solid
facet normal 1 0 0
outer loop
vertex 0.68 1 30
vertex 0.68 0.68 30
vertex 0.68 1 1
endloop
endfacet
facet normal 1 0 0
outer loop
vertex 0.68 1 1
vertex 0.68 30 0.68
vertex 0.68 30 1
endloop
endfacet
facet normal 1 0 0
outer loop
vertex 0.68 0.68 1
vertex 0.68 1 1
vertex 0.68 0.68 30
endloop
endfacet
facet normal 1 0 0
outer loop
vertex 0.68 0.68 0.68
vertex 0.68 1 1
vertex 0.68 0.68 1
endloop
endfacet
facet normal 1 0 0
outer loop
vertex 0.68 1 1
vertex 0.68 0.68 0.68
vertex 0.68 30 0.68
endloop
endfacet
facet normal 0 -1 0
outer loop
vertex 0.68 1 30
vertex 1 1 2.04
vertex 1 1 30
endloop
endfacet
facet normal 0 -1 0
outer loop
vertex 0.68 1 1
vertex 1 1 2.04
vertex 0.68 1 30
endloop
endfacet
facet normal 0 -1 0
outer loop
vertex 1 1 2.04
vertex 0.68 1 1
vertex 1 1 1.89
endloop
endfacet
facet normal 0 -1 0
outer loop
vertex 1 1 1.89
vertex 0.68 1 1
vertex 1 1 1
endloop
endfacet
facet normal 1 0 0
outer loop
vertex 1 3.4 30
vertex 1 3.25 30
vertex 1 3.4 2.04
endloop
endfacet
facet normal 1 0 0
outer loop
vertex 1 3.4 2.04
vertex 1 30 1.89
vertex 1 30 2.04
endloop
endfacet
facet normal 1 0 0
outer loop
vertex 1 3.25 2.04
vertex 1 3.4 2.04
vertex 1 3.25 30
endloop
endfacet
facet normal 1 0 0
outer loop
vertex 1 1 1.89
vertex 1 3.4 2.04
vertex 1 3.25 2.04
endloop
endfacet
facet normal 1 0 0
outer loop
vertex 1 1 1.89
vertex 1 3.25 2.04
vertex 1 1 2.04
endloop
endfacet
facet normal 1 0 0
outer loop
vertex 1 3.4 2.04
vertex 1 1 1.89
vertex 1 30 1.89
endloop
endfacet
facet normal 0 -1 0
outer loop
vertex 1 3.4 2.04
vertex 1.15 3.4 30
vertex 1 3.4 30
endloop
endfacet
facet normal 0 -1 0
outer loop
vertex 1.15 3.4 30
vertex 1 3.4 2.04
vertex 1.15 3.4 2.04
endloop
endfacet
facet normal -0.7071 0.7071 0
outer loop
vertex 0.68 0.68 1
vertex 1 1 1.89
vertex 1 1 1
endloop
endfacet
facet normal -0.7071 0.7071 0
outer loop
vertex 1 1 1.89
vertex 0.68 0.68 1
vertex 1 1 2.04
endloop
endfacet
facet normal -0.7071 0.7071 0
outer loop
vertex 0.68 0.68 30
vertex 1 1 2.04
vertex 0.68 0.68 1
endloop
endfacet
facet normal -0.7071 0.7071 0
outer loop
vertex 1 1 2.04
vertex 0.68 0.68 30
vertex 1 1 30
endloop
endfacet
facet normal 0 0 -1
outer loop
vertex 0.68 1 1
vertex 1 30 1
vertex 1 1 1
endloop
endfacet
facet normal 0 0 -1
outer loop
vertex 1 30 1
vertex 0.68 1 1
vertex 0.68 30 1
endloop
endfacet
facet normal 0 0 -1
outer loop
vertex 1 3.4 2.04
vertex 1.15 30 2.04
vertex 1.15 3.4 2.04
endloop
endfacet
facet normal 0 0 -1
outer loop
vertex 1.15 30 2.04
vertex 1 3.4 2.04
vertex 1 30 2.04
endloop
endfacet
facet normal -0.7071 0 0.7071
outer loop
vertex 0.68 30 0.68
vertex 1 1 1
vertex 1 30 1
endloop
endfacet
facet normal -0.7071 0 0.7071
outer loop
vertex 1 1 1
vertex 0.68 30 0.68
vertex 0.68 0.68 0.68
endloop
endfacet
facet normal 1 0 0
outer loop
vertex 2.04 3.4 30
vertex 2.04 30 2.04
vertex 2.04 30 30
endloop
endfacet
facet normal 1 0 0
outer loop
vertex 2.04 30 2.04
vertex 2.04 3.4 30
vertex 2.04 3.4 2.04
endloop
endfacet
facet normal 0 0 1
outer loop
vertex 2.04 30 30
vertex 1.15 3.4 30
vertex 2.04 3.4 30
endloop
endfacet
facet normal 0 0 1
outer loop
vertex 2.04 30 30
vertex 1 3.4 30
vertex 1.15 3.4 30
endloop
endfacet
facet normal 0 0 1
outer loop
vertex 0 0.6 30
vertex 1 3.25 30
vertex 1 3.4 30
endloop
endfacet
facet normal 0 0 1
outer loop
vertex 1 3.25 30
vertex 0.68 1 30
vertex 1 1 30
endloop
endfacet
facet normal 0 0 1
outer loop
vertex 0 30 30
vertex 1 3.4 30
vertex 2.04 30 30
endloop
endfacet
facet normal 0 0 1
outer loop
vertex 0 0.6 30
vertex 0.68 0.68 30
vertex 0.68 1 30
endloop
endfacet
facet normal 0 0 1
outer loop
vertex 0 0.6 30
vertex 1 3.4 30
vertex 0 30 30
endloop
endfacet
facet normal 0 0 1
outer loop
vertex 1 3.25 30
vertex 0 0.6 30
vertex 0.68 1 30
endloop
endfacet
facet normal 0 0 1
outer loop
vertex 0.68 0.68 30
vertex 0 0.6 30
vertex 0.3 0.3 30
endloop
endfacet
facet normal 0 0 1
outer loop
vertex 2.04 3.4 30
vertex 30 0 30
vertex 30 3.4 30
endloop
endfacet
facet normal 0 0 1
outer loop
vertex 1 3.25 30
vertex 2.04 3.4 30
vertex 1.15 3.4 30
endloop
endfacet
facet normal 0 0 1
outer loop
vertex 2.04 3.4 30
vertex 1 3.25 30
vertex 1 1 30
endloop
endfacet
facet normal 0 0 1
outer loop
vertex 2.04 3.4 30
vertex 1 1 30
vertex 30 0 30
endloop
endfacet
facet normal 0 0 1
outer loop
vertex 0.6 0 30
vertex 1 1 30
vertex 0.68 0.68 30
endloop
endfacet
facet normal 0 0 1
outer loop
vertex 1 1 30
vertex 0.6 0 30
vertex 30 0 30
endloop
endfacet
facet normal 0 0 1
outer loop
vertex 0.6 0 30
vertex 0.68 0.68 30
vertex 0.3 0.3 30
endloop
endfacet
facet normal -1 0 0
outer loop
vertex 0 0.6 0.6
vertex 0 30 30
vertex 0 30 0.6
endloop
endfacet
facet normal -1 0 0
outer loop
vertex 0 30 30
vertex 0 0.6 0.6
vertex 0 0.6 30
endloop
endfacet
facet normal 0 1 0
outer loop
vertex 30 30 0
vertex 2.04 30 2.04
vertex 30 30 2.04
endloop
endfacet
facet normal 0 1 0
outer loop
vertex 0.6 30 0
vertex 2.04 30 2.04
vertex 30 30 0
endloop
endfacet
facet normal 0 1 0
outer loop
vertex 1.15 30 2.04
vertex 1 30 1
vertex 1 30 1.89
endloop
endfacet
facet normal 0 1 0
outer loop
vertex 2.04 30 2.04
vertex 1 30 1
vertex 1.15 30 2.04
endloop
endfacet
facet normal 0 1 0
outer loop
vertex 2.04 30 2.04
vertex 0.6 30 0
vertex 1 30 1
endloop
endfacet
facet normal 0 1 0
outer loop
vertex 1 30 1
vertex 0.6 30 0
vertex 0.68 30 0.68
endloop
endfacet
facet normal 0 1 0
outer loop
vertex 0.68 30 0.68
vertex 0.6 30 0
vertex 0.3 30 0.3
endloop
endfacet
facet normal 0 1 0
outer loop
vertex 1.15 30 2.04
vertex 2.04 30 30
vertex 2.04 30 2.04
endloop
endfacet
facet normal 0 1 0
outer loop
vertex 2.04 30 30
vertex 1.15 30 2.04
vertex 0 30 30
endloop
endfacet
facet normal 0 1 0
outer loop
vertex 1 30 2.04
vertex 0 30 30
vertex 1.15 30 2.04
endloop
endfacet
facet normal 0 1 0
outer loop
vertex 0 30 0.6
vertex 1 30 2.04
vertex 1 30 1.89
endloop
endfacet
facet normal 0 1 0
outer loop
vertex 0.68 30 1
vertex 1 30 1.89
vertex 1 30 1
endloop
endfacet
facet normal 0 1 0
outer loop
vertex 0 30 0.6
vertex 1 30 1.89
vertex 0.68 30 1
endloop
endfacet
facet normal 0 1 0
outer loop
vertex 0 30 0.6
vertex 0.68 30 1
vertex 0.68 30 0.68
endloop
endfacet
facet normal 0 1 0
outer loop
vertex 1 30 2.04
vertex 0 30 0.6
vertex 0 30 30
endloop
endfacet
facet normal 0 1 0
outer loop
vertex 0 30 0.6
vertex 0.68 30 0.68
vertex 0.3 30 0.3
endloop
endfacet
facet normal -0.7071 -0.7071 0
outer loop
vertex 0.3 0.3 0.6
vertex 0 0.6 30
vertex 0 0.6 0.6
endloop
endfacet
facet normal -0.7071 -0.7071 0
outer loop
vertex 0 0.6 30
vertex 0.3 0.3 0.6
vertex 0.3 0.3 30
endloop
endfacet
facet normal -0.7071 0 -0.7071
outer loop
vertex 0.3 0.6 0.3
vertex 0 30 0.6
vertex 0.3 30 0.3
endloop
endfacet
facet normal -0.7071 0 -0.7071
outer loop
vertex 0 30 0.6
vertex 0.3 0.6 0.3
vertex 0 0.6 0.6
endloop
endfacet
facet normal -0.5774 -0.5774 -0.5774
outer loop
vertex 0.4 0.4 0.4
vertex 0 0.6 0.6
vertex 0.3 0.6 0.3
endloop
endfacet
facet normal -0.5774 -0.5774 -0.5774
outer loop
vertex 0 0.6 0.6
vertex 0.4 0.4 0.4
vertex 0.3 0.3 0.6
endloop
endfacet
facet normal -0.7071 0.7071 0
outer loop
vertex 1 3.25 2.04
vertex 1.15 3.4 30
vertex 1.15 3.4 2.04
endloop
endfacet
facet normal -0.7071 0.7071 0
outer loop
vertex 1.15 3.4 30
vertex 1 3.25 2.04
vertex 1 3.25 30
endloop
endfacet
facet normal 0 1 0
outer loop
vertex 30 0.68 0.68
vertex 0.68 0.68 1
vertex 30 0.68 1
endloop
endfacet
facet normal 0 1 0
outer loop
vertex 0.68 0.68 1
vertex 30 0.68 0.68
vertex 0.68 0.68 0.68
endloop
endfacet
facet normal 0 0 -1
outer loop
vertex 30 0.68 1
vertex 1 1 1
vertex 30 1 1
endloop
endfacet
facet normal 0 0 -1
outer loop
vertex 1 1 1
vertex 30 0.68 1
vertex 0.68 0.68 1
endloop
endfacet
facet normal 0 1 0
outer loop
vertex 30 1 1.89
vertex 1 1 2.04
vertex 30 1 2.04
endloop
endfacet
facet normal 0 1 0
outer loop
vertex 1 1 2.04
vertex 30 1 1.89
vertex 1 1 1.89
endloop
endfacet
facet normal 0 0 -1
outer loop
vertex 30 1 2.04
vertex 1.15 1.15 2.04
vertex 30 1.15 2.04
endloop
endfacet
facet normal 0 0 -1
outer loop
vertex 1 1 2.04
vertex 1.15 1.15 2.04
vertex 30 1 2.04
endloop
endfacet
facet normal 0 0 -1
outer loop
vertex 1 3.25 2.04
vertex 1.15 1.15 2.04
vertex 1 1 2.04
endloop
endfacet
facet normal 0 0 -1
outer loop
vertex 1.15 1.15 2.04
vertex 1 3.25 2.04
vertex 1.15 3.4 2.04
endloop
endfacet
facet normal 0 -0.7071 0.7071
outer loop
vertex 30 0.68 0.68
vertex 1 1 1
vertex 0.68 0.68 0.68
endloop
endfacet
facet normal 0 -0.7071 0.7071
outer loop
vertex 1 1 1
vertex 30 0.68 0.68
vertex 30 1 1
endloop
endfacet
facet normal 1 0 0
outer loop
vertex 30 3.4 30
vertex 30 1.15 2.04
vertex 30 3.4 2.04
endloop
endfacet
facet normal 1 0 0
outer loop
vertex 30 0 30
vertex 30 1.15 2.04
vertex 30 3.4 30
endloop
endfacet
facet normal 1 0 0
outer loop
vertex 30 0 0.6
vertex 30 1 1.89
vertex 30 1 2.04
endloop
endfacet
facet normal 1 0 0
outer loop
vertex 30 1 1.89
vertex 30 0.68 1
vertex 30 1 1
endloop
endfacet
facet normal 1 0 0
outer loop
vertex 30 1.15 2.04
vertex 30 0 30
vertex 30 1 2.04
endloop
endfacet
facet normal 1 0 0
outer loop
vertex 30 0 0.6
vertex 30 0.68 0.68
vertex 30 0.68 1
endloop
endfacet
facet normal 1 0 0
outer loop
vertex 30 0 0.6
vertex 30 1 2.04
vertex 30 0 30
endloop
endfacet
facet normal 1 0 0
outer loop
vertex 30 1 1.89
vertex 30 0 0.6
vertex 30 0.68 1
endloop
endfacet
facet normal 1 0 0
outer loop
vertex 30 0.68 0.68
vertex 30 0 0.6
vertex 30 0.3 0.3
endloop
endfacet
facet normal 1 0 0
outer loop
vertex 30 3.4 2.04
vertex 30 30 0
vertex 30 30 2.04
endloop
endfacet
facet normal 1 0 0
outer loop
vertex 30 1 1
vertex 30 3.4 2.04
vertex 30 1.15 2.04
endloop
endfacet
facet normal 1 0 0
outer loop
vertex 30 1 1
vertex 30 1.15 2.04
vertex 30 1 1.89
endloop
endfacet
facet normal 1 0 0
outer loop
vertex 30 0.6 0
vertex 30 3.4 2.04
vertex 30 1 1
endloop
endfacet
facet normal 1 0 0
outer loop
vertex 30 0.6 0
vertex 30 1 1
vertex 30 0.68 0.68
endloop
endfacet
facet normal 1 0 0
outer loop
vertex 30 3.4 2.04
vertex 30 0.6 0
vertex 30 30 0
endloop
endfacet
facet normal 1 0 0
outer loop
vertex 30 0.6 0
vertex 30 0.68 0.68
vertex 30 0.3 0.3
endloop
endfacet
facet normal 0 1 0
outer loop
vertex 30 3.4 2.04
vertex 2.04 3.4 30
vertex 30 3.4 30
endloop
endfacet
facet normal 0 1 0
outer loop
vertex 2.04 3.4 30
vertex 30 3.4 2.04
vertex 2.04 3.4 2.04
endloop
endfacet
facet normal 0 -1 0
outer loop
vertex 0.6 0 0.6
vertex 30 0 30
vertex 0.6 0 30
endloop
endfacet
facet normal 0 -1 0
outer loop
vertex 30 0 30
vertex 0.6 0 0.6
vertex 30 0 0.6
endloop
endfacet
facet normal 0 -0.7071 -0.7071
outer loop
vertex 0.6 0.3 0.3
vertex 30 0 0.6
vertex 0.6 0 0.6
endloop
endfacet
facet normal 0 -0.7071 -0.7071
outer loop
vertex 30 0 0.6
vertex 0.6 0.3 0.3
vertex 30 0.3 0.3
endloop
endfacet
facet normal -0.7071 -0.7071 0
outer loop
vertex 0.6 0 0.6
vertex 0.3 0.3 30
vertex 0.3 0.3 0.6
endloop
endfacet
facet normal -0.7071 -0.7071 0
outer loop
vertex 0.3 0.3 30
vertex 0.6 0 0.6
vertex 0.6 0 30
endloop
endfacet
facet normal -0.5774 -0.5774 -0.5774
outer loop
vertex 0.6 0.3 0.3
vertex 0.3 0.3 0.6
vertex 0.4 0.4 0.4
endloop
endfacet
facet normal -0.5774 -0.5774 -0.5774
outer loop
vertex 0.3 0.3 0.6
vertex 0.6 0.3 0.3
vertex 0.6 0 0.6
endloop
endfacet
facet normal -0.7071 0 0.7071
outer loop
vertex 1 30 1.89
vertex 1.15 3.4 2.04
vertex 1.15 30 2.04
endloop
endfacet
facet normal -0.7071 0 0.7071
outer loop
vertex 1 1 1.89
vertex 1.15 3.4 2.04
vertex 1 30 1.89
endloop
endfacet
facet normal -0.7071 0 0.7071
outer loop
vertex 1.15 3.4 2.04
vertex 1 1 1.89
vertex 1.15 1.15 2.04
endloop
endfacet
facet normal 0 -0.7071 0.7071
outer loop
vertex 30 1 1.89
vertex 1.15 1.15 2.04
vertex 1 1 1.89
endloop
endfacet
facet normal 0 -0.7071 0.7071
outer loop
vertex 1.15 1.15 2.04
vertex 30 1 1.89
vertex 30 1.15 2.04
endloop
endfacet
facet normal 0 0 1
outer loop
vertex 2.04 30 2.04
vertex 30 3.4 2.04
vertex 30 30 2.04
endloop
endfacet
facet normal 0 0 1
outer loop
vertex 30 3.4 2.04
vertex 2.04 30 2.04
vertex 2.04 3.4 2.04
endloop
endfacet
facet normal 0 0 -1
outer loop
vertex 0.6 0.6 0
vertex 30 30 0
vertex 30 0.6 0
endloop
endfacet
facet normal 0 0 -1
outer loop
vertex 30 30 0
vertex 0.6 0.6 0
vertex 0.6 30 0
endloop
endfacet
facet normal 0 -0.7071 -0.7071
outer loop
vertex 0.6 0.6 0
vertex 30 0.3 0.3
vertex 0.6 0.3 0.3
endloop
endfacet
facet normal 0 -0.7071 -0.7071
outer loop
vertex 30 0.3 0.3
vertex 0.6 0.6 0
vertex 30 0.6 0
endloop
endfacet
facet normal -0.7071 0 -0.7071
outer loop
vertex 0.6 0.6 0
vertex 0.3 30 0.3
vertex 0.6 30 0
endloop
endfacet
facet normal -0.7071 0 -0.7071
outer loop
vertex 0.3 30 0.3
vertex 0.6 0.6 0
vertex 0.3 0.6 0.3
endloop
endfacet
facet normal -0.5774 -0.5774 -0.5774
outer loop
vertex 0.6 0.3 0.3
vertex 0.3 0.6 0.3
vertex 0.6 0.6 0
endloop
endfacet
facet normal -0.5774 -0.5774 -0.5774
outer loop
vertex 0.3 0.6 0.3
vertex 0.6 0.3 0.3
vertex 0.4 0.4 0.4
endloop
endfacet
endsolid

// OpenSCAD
// file: ../../lib/piece.scad
// Pieces: what a print is made of, as the slicer sees it.
//
//   use <../../lib/orca.scad>
//   use <../../lib/piece.scad>
//   piece("lid", [orca_bottom_pattern("concentric")]) color("green") lid();
//
// A piece is a part in Orca, with a name and, if it likes, slicer settings of
// its own: a list of them, from orca.scad (python/generate.py makes the
// projects). Draw every solid of a print inside one; they can be anywhere,
// in a module as well as at the top of the file, but not inside each other.
// Either mistake stops the export: a solid in no piece would be in all of them.
//
// Orca keeps some settings for a whole object, not a part: a layer height, a
// seam's place, a brim. A piece with one of those becomes an object of its
// own, beside the object of everything else, along with any that share its
// name.
//
// OpenSCAD has no way to hand over one piece of what it draws, or to name
// it. So a piece says what it is in the log, and generate.py asks for each in
// turn, by setting $only: then every other piece draws nothing.
//
// Pieces that share a name and settings come out together. Give them
// different colors and each is still a part of its own, so long as they are
// separate statements at the top of the file; drawn inside a module they are
// one solid, and want names of their own.
//
// $piece_prefix goes before the names of the pieces drawn under it, to tell
// apart those of a module drawn more than once.

use <orca.scad>

module piece(name, settings = []) {
  assert(name != "", "a piece wants a name");
  outer = is_undef($in_piece) ? "" : $in_piece;
  assert(outer == "", str("piece ", name, " is inside piece ", outer, ", and would never be drawn"));
  full = is_undef($piece_prefix) || $piece_prefix == "" ? name : str($piece_prefix, " ", name);
  flat = orca_flat(settings);
  echo(piece = full, orca = flat);
  // Asked for as they are written in the log.
  if (is_undef($only) || $only == [full, str(flat)]) {
    $in_piece = full;
    children();
  }
}
// file: ../../lib/orca.scad
// Orca's settings, for a whole print or for one piece of it.
//
//   use <../../lib/orca.scad>
//   use <../../lib/piece.scad>
//   orca([orca_process("0.12 Fine"), orca_layer_height(0.1)]);
//   piece("lid", [orca_bottom_pattern("concentric")]) lid();
//
// A setting is a function here, the same one wherever it is used: it gives a
// [key, value], the key being the setting's name in Orca's preset files (and
// in its PrintConfig.cpp). orca_setting is any of them, by that name; the
// rest are the ones in use, named to be read.
//
// Settings go in a list, and a list of them can go in another: orca_brim is
// two, say.
//
// orca() is for the whole print. It can be anywhere, more than once, and under
// an `if`; a later one's settings win. Opening the project applies them on top
// of whatever presets Orca has selected, and leaves everything else alone.
// piece() takes a list for that piece alone (piece.scad). Either way they
// reach python/generate.py through OpenSCAD's log.
//
// printer, process and filament are not settings but presets, which Orca
// keeps as selected: those say what to pick by hand, in the project's name.

module orca(settings) {
  echo(orca = orca_flat(settings));
}

// A list of settings, and of lists of them, as one list of [key, value].
function orca_flat(v) =
  is_undef(v) || v == [] || v == "" ? [] : is_string(v[0]) ? [v] : [for (x = v) each orca_flat(x)];

// Any setting, by its name in Orca.
function orca_setting(key, value) = [key, value];

// The process preset to pick.
function orca_process(name) = ["process", name];

function orca_layer_height(h) = ["layer_height", h];
function orca_first_layer_height(h) = ["initial_layer_print_height", h];
// How far the first layer is drawn in, against its squash on the bed.
function orca_elephant_foot(mm) = ["elefant_foot_compensation", mm];

// Where each layer's seam goes: nearest, aligned, back, random.
function orca_seam(position) = ["seam_position", position];

// The pattern of the face on the bed, and of the one on top: monotonic,
// concentric, hilbertcurve, octagramspiral, archimedeanchords...
function orca_bottom_pattern(pattern) = ["bottom_surface_pattern", pattern];
function orca_top_pattern(pattern) = ["top_surface_pattern", pattern];
// The direction of those faces' lines, in degrees counter-clockwise from +x.
function orca_bottom_direction(a) = ["bottom_layer_direction", a];
function orca_top_direction(a) = ["top_layer_direction", a];
// The direction of the first layer's lines on the bed, likewise.
function orca_solid_infill_direction(a) = ["solid_infill_direction", a];
// Directions follow the model, so that turning it in Orca turns the lines too.
function orca_align_infill_to_model(on = true) = ["align_infill_direction_to_model", on ? 1 : 0];

// A brim: outer_only, inner_only, outer_and_inner, no_brim.
function orca_brim(type, width) = [["brim_type", type], ["brim_width", width]];

// A rough skin: on external walls, all of them, or none. What isn't given
// stays as it is in Orca.
function orca_fuzzy_skin(where = "external", thickness, point_distance, noise, scale, octaves, persistence) = [
  ["fuzzy_skin", where],
  if (!is_undef(thickness)) ["fuzzy_skin_thickness", thickness],
  if (!is_undef(point_distance)) ["fuzzy_skin_point_distance", point_distance],
  if (!is_undef(noise)) ["fuzzy_skin_noise_type", noise],
  if (!is_undef(scale)) ["fuzzy_skin_scale", scale],
  if (!is_undef(octaves)) ["fuzzy_skin_octaves", octaves],
  if (!is_undef(persistence)) ["fuzzy_skin_persistence", persistence],
];
// main file
// Coupon for a box corner in mitred rabbets (see mitred-rabbet.scad): the
// three panels that meet there, each printed with its outside face on the bed.
//
// The corner is at the origin and the box's inside is +x, +y, +z. Panel i's
// outside face is the plane where axis i is 0: 0 is a side, 1 the front, 2
// the floor. That is also their rank: along each edge, the higher panel ends
// square and sits in a rabbet in the lower one. So the front drops between
// the sides, and the floor drops into all the walls.
//
// Each panel is its slab, less what the joint along each of its two edges
// gives to the other panel there. Those cuts run on through the corner, and
// between them share it out with nothing left over and nothing overhanging.

// export: print

use <../../lib/orca.scad>
use <../../lib/piece.scad>

orca([orca_process("0.08 High Quality"), orca_layer_height(0.08), orca_first_layer_height(0.2), orca_seam("back")]);

/* [Output] */
part = "fit"; // [fit, exploded, print]

/* [Joint] */
// Panel thickness: side, front, floor. Rough; see `t`.
thick = [2, 3.4, 2];
// Depth of the mitre below the outside faces; also the thickness of the
// tongue under a rabbet. Rough; see `mitre`.
mitre_depth = 1;
// Gap between the mitre's faces, taken from the lower panel and measured
// along its face. At 0.2 mm layers a printed 45° face is proud of the model,
// and levers the panels acute; at 0.08 mm, mitred-rabbet.scad's pairs were
// squarest and tightest with none, and leant further open with each 0.05 mm.
mitre_gap = 0;
// Gap between a panel's end and the floor of the rabbet it sits in.
gap = 0;
// Depth of the glue break: a trough under the mitre's inner end, cut from
// the lower panel. The joint goes together dry, and thin glue run along the
// inside corner wicks through the rabbet; it can't cross the trough, so it
// stops short of the mitre and the outside. Rough; see `brk`.
break_depth = 0.3;
// Chamfer on the box's outside edges.
chamfer = 0.6;
// Relief on a panel's inside end corner, to clear the rabbet's inside corner.
relief = 0.15;

/* [Layers] */
// As sliced. Heights in the joint snap to whole layers.
first_layer = 0.2;
layer = 0.08;

/* [Coupon] */
// Length of each edge.
len = 30;
bed_gap = 5;
explode = 8;

/* [Hidden] */
big = 2 * len;

// h to the nearest height the slicer ends a layer at.
function snap(h) = first_layer + round((h - first_layer) / layer) * layer;
t = [for (h = thick) snap(h)];
mitre = snap(mitre_depth);
brk = round(break_depth / layer) * layer;
names = ["side", "front", "floor"];

function unit(i) = [for (k = [0 : 2]) k == i ? 1 : 0];

// Children drawn in (depth below a, depth below b, along their edge) land in
// box coordinates.
module edge_frame(a, b) {
  ea = unit(a); eb = unit(b); ec = unit(3 - a - b);
  multmatrix([for (k = [0 : 2]) [ea[k], eb[k], ec[k], 0]]) translate([0, 0, -1]) linear_extrude(big)
    children();
}

// What panel a, the higher, gives up along its edge with b: outside the
// mitre, and then below its square end.
module cut_higher(a, b) {
  e = mitre + gap;
  edge_frame(a, b)
    polygon([[-1, -1], [mitre, mitre], [mitre, e], [t[a] - relief, e], [t[a], e + relief],
             [big, e + relief], [big, -1]]);
}

// What panel b, the lower, gives up along its edge with a: outside the
// mitre, the glue break, and then the rabbet, as wide as a is thick.
module cut_lower(a, b) {
  edge_frame(a, b)
    polygon([[mitre_gap - 1, -1], [mitre - brk + mitre_gap, mitre - brk], [mitre + mitre_gap, mitre - brk],
             [mitre + mitre_gap, mitre], [t[a], mitre], [t[a], big], [-1, big], [-1, -1]]);
}

module outer() {
  c = chamfer;
  hull() {
    translate([c, c, 0]) cube(big);
    translate([c, 0, c]) cube(big);
    translate([0, c, c]) cube(big);
  }
}

module panel(i) {
  intersection() {
    difference() {
      cube([for (k = [0 : 2]) k == i ? t[i] : len]);
      for (j = [0 : 2]) if (j != i) {
        if (i > j) cut_higher(i, j);
        else cut_lower(j, i);
      }
    }
    outer();
  }
}

// On the bed, outside face down.
module flat(i) {
  translate([i * (len + bed_gap), 0, 0])
    if (i == 0) multmatrix([[0, 1, 0, 0], [0, 0, 1, 0], [1, 0, 0, 0]]) children();
    else if (i == 1) multmatrix([[0, 0, 1, 0], [1, 0, 0, 0], [0, 1, 0, 0]]) children();
    else children();
}

colors = ["darkgreen", "forestgreen", "seagreen"];
if (part == "print") {
  piece(names[0]) color(colors[0]) flat(0) panel(0);
  piece(names[1]) color(colors[0]) flat(1) panel(1);
  piece(names[2]) color(colors[0]) flat(2) panel(2);
} else {
  e = part == "exploded" ? explode : 0;
  for (i = [0 : 2]) color(colors[i]) translate(-e * unit(i)) panel(i);
}
